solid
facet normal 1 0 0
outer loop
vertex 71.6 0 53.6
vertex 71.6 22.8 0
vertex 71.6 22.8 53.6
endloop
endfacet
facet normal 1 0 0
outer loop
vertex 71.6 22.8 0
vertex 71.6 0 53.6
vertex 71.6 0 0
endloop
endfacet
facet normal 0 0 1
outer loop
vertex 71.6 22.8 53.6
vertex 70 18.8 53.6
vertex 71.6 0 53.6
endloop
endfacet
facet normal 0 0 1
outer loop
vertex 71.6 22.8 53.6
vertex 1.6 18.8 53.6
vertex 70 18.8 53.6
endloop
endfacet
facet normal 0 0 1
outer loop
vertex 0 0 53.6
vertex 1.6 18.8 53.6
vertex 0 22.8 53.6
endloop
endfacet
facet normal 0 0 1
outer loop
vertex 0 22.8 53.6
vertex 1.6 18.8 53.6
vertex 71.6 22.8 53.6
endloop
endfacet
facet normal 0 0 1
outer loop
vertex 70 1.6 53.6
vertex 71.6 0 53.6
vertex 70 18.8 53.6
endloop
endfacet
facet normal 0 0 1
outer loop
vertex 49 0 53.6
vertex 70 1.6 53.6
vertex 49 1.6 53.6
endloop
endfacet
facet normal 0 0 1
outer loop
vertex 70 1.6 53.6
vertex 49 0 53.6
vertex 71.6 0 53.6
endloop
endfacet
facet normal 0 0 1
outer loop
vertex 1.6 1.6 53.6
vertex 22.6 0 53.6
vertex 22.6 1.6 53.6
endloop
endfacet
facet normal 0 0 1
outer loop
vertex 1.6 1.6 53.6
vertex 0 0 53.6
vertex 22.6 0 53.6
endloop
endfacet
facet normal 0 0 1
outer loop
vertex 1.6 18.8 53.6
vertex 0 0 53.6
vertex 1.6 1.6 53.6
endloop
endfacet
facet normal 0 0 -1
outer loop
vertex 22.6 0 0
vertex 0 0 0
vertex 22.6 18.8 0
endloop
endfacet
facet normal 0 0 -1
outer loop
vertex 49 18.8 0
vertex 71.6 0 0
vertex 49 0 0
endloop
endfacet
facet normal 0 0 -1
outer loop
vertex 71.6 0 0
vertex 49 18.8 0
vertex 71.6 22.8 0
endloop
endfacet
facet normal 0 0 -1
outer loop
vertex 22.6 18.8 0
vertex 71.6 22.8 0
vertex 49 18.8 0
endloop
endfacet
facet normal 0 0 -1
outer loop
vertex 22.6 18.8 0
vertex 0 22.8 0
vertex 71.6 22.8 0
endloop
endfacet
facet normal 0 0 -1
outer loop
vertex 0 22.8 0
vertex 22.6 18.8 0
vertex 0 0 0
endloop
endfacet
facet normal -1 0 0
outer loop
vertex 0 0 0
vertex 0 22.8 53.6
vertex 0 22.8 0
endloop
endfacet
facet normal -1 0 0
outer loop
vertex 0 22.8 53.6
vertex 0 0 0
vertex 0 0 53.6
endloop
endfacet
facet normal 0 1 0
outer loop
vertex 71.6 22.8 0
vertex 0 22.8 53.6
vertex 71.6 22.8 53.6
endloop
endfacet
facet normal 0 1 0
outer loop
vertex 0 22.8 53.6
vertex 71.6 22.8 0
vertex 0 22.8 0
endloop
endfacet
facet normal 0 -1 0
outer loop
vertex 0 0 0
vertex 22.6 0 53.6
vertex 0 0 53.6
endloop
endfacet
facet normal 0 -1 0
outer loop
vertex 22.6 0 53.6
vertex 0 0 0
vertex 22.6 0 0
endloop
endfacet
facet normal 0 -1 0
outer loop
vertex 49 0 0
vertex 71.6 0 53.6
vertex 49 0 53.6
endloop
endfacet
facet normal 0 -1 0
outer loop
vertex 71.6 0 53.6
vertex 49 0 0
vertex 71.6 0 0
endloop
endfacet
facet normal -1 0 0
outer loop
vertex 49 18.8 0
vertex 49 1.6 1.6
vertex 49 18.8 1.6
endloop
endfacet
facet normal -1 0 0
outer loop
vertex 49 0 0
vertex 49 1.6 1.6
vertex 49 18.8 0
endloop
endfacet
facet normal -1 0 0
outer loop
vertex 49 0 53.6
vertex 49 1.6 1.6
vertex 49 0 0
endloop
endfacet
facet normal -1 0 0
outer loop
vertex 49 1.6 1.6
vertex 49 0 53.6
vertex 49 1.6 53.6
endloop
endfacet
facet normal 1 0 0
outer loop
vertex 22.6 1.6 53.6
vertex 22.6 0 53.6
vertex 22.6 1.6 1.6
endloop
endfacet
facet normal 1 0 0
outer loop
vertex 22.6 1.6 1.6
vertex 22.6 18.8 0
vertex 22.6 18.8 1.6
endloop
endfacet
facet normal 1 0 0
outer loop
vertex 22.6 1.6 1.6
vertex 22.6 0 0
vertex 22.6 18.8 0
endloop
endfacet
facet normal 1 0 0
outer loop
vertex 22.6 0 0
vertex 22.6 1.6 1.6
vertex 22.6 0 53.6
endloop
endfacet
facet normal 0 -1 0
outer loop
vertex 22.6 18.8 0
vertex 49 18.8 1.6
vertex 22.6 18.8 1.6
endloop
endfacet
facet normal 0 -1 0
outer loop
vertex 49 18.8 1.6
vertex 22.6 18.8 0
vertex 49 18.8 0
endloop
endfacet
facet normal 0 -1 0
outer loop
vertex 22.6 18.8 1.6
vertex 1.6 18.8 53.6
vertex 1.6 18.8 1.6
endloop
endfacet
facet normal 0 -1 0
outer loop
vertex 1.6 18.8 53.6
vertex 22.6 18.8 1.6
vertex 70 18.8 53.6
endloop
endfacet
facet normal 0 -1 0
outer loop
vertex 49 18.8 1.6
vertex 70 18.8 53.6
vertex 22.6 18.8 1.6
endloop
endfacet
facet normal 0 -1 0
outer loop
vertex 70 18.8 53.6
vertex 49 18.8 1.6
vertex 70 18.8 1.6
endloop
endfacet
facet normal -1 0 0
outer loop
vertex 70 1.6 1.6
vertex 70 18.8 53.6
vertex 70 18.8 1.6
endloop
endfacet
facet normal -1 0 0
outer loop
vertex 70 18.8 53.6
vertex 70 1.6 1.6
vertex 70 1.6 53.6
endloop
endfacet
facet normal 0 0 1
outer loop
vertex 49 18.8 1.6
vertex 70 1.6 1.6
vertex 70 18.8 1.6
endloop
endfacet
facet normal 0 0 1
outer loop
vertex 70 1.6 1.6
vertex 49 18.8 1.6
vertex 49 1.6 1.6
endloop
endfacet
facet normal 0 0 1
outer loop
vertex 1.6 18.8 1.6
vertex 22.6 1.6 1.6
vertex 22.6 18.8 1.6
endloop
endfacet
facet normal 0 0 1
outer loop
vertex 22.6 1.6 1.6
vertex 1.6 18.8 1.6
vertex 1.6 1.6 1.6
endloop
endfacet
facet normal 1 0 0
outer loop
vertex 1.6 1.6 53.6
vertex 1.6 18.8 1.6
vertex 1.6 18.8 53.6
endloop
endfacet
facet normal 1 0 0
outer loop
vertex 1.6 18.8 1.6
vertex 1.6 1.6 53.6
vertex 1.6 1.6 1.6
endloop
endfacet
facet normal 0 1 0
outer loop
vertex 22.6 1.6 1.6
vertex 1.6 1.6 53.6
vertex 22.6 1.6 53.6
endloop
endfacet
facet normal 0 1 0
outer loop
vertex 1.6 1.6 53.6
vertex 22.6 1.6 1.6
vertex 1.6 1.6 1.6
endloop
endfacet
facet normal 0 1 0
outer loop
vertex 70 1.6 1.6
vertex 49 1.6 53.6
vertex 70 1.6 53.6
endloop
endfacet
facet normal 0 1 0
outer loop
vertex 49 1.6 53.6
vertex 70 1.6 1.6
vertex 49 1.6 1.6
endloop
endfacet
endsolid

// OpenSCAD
//Tickness
t=1.6;
//Thickness hinten
th=4.0; //wegen Kamera
//Toleranz
tow=1;
tod=1;
//Breite (ohne Tasten, geschlossen)
bg=67.4+tow;
// Hoehe Klebeband
hk=25+1;
// Hoehe Halter
hh=hk*2;
//Tiefe breite Seite (geschlossen, ohne Kamera)
tbs=16.2+tod;
//Tiefe schmale Seite ("")
tss=14+tod;
//Abstand zum USB-Slot
ausb=21;

module klotz()
{
    cube([bg+t*2,tbs+t+th,hh+t]);
}

module slotusb()
{
    color("blue")
    
    translate([ausb+t,0,0])
    cube([bg-ausb*2,tbs+t,hh+t]);
}

module slothandy()
{
    color("red")
    
    translate([t,t,t])
    cube([bg,tbs,hh]);
}

difference()
{
    klotz();
    slotusb();
    slothandy();
}
